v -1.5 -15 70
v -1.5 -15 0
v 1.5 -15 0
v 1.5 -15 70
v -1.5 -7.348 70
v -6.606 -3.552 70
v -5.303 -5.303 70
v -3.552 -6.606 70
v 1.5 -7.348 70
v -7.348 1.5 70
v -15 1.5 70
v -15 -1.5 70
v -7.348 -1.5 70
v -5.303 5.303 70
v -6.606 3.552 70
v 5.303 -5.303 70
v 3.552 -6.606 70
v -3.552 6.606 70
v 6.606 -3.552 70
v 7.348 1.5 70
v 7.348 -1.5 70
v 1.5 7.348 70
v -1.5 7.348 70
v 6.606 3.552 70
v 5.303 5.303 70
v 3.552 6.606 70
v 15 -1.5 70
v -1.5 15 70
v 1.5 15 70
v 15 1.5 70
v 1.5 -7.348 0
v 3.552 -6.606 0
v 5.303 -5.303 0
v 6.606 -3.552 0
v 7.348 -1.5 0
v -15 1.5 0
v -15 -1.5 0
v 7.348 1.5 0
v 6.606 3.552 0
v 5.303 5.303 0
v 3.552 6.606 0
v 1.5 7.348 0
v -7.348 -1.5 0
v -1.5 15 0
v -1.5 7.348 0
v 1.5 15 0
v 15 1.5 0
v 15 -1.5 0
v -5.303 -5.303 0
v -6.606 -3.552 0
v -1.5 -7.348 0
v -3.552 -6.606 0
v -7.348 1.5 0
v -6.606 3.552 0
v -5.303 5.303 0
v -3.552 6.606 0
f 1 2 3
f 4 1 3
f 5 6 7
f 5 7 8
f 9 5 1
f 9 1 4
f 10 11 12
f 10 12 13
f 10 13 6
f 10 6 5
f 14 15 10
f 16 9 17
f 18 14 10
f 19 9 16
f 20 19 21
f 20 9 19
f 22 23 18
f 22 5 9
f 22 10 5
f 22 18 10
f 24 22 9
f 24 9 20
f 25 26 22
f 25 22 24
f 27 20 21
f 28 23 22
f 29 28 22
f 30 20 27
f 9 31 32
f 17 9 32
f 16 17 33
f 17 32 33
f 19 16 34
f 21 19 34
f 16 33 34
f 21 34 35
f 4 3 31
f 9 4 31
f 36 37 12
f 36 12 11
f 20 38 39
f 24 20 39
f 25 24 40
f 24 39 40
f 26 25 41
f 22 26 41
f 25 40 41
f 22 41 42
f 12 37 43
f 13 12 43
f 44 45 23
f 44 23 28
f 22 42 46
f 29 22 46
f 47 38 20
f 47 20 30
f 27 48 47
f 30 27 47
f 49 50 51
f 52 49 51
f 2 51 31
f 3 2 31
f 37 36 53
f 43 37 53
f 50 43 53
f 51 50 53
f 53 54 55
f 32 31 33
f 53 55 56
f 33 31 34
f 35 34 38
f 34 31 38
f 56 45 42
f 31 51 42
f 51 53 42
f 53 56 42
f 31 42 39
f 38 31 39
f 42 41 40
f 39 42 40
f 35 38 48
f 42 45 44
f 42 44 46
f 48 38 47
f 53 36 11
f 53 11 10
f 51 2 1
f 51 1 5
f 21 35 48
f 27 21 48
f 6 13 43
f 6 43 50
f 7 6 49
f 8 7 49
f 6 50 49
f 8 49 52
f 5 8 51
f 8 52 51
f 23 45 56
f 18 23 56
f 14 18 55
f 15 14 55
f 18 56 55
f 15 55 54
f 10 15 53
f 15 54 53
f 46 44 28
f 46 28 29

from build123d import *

# Parameters (mm, degrees)
SKETCH1_R           = 7.5
SKETCH1_W           = 30
SKETCH1_H           = 3
SKETCH1_W_2         = 3
SKETCH1_H_2         = 30
BOSS_EXTRUDE2_DEPTH = 70


with BuildPart() as part:
    # Sketch1 → Boss-Extrude2 (new body)
    with BuildSketch(Plane.XY):
        Circle(SKETCH1_R)
        Rectangle(SKETCH1_W, SKETCH1_H)
        Rectangle(SKETCH1_W_2, SKETCH1_H_2)
    extrude(amount=BOSS_EXTRUDE2_DEPTH)


solid = part.part
